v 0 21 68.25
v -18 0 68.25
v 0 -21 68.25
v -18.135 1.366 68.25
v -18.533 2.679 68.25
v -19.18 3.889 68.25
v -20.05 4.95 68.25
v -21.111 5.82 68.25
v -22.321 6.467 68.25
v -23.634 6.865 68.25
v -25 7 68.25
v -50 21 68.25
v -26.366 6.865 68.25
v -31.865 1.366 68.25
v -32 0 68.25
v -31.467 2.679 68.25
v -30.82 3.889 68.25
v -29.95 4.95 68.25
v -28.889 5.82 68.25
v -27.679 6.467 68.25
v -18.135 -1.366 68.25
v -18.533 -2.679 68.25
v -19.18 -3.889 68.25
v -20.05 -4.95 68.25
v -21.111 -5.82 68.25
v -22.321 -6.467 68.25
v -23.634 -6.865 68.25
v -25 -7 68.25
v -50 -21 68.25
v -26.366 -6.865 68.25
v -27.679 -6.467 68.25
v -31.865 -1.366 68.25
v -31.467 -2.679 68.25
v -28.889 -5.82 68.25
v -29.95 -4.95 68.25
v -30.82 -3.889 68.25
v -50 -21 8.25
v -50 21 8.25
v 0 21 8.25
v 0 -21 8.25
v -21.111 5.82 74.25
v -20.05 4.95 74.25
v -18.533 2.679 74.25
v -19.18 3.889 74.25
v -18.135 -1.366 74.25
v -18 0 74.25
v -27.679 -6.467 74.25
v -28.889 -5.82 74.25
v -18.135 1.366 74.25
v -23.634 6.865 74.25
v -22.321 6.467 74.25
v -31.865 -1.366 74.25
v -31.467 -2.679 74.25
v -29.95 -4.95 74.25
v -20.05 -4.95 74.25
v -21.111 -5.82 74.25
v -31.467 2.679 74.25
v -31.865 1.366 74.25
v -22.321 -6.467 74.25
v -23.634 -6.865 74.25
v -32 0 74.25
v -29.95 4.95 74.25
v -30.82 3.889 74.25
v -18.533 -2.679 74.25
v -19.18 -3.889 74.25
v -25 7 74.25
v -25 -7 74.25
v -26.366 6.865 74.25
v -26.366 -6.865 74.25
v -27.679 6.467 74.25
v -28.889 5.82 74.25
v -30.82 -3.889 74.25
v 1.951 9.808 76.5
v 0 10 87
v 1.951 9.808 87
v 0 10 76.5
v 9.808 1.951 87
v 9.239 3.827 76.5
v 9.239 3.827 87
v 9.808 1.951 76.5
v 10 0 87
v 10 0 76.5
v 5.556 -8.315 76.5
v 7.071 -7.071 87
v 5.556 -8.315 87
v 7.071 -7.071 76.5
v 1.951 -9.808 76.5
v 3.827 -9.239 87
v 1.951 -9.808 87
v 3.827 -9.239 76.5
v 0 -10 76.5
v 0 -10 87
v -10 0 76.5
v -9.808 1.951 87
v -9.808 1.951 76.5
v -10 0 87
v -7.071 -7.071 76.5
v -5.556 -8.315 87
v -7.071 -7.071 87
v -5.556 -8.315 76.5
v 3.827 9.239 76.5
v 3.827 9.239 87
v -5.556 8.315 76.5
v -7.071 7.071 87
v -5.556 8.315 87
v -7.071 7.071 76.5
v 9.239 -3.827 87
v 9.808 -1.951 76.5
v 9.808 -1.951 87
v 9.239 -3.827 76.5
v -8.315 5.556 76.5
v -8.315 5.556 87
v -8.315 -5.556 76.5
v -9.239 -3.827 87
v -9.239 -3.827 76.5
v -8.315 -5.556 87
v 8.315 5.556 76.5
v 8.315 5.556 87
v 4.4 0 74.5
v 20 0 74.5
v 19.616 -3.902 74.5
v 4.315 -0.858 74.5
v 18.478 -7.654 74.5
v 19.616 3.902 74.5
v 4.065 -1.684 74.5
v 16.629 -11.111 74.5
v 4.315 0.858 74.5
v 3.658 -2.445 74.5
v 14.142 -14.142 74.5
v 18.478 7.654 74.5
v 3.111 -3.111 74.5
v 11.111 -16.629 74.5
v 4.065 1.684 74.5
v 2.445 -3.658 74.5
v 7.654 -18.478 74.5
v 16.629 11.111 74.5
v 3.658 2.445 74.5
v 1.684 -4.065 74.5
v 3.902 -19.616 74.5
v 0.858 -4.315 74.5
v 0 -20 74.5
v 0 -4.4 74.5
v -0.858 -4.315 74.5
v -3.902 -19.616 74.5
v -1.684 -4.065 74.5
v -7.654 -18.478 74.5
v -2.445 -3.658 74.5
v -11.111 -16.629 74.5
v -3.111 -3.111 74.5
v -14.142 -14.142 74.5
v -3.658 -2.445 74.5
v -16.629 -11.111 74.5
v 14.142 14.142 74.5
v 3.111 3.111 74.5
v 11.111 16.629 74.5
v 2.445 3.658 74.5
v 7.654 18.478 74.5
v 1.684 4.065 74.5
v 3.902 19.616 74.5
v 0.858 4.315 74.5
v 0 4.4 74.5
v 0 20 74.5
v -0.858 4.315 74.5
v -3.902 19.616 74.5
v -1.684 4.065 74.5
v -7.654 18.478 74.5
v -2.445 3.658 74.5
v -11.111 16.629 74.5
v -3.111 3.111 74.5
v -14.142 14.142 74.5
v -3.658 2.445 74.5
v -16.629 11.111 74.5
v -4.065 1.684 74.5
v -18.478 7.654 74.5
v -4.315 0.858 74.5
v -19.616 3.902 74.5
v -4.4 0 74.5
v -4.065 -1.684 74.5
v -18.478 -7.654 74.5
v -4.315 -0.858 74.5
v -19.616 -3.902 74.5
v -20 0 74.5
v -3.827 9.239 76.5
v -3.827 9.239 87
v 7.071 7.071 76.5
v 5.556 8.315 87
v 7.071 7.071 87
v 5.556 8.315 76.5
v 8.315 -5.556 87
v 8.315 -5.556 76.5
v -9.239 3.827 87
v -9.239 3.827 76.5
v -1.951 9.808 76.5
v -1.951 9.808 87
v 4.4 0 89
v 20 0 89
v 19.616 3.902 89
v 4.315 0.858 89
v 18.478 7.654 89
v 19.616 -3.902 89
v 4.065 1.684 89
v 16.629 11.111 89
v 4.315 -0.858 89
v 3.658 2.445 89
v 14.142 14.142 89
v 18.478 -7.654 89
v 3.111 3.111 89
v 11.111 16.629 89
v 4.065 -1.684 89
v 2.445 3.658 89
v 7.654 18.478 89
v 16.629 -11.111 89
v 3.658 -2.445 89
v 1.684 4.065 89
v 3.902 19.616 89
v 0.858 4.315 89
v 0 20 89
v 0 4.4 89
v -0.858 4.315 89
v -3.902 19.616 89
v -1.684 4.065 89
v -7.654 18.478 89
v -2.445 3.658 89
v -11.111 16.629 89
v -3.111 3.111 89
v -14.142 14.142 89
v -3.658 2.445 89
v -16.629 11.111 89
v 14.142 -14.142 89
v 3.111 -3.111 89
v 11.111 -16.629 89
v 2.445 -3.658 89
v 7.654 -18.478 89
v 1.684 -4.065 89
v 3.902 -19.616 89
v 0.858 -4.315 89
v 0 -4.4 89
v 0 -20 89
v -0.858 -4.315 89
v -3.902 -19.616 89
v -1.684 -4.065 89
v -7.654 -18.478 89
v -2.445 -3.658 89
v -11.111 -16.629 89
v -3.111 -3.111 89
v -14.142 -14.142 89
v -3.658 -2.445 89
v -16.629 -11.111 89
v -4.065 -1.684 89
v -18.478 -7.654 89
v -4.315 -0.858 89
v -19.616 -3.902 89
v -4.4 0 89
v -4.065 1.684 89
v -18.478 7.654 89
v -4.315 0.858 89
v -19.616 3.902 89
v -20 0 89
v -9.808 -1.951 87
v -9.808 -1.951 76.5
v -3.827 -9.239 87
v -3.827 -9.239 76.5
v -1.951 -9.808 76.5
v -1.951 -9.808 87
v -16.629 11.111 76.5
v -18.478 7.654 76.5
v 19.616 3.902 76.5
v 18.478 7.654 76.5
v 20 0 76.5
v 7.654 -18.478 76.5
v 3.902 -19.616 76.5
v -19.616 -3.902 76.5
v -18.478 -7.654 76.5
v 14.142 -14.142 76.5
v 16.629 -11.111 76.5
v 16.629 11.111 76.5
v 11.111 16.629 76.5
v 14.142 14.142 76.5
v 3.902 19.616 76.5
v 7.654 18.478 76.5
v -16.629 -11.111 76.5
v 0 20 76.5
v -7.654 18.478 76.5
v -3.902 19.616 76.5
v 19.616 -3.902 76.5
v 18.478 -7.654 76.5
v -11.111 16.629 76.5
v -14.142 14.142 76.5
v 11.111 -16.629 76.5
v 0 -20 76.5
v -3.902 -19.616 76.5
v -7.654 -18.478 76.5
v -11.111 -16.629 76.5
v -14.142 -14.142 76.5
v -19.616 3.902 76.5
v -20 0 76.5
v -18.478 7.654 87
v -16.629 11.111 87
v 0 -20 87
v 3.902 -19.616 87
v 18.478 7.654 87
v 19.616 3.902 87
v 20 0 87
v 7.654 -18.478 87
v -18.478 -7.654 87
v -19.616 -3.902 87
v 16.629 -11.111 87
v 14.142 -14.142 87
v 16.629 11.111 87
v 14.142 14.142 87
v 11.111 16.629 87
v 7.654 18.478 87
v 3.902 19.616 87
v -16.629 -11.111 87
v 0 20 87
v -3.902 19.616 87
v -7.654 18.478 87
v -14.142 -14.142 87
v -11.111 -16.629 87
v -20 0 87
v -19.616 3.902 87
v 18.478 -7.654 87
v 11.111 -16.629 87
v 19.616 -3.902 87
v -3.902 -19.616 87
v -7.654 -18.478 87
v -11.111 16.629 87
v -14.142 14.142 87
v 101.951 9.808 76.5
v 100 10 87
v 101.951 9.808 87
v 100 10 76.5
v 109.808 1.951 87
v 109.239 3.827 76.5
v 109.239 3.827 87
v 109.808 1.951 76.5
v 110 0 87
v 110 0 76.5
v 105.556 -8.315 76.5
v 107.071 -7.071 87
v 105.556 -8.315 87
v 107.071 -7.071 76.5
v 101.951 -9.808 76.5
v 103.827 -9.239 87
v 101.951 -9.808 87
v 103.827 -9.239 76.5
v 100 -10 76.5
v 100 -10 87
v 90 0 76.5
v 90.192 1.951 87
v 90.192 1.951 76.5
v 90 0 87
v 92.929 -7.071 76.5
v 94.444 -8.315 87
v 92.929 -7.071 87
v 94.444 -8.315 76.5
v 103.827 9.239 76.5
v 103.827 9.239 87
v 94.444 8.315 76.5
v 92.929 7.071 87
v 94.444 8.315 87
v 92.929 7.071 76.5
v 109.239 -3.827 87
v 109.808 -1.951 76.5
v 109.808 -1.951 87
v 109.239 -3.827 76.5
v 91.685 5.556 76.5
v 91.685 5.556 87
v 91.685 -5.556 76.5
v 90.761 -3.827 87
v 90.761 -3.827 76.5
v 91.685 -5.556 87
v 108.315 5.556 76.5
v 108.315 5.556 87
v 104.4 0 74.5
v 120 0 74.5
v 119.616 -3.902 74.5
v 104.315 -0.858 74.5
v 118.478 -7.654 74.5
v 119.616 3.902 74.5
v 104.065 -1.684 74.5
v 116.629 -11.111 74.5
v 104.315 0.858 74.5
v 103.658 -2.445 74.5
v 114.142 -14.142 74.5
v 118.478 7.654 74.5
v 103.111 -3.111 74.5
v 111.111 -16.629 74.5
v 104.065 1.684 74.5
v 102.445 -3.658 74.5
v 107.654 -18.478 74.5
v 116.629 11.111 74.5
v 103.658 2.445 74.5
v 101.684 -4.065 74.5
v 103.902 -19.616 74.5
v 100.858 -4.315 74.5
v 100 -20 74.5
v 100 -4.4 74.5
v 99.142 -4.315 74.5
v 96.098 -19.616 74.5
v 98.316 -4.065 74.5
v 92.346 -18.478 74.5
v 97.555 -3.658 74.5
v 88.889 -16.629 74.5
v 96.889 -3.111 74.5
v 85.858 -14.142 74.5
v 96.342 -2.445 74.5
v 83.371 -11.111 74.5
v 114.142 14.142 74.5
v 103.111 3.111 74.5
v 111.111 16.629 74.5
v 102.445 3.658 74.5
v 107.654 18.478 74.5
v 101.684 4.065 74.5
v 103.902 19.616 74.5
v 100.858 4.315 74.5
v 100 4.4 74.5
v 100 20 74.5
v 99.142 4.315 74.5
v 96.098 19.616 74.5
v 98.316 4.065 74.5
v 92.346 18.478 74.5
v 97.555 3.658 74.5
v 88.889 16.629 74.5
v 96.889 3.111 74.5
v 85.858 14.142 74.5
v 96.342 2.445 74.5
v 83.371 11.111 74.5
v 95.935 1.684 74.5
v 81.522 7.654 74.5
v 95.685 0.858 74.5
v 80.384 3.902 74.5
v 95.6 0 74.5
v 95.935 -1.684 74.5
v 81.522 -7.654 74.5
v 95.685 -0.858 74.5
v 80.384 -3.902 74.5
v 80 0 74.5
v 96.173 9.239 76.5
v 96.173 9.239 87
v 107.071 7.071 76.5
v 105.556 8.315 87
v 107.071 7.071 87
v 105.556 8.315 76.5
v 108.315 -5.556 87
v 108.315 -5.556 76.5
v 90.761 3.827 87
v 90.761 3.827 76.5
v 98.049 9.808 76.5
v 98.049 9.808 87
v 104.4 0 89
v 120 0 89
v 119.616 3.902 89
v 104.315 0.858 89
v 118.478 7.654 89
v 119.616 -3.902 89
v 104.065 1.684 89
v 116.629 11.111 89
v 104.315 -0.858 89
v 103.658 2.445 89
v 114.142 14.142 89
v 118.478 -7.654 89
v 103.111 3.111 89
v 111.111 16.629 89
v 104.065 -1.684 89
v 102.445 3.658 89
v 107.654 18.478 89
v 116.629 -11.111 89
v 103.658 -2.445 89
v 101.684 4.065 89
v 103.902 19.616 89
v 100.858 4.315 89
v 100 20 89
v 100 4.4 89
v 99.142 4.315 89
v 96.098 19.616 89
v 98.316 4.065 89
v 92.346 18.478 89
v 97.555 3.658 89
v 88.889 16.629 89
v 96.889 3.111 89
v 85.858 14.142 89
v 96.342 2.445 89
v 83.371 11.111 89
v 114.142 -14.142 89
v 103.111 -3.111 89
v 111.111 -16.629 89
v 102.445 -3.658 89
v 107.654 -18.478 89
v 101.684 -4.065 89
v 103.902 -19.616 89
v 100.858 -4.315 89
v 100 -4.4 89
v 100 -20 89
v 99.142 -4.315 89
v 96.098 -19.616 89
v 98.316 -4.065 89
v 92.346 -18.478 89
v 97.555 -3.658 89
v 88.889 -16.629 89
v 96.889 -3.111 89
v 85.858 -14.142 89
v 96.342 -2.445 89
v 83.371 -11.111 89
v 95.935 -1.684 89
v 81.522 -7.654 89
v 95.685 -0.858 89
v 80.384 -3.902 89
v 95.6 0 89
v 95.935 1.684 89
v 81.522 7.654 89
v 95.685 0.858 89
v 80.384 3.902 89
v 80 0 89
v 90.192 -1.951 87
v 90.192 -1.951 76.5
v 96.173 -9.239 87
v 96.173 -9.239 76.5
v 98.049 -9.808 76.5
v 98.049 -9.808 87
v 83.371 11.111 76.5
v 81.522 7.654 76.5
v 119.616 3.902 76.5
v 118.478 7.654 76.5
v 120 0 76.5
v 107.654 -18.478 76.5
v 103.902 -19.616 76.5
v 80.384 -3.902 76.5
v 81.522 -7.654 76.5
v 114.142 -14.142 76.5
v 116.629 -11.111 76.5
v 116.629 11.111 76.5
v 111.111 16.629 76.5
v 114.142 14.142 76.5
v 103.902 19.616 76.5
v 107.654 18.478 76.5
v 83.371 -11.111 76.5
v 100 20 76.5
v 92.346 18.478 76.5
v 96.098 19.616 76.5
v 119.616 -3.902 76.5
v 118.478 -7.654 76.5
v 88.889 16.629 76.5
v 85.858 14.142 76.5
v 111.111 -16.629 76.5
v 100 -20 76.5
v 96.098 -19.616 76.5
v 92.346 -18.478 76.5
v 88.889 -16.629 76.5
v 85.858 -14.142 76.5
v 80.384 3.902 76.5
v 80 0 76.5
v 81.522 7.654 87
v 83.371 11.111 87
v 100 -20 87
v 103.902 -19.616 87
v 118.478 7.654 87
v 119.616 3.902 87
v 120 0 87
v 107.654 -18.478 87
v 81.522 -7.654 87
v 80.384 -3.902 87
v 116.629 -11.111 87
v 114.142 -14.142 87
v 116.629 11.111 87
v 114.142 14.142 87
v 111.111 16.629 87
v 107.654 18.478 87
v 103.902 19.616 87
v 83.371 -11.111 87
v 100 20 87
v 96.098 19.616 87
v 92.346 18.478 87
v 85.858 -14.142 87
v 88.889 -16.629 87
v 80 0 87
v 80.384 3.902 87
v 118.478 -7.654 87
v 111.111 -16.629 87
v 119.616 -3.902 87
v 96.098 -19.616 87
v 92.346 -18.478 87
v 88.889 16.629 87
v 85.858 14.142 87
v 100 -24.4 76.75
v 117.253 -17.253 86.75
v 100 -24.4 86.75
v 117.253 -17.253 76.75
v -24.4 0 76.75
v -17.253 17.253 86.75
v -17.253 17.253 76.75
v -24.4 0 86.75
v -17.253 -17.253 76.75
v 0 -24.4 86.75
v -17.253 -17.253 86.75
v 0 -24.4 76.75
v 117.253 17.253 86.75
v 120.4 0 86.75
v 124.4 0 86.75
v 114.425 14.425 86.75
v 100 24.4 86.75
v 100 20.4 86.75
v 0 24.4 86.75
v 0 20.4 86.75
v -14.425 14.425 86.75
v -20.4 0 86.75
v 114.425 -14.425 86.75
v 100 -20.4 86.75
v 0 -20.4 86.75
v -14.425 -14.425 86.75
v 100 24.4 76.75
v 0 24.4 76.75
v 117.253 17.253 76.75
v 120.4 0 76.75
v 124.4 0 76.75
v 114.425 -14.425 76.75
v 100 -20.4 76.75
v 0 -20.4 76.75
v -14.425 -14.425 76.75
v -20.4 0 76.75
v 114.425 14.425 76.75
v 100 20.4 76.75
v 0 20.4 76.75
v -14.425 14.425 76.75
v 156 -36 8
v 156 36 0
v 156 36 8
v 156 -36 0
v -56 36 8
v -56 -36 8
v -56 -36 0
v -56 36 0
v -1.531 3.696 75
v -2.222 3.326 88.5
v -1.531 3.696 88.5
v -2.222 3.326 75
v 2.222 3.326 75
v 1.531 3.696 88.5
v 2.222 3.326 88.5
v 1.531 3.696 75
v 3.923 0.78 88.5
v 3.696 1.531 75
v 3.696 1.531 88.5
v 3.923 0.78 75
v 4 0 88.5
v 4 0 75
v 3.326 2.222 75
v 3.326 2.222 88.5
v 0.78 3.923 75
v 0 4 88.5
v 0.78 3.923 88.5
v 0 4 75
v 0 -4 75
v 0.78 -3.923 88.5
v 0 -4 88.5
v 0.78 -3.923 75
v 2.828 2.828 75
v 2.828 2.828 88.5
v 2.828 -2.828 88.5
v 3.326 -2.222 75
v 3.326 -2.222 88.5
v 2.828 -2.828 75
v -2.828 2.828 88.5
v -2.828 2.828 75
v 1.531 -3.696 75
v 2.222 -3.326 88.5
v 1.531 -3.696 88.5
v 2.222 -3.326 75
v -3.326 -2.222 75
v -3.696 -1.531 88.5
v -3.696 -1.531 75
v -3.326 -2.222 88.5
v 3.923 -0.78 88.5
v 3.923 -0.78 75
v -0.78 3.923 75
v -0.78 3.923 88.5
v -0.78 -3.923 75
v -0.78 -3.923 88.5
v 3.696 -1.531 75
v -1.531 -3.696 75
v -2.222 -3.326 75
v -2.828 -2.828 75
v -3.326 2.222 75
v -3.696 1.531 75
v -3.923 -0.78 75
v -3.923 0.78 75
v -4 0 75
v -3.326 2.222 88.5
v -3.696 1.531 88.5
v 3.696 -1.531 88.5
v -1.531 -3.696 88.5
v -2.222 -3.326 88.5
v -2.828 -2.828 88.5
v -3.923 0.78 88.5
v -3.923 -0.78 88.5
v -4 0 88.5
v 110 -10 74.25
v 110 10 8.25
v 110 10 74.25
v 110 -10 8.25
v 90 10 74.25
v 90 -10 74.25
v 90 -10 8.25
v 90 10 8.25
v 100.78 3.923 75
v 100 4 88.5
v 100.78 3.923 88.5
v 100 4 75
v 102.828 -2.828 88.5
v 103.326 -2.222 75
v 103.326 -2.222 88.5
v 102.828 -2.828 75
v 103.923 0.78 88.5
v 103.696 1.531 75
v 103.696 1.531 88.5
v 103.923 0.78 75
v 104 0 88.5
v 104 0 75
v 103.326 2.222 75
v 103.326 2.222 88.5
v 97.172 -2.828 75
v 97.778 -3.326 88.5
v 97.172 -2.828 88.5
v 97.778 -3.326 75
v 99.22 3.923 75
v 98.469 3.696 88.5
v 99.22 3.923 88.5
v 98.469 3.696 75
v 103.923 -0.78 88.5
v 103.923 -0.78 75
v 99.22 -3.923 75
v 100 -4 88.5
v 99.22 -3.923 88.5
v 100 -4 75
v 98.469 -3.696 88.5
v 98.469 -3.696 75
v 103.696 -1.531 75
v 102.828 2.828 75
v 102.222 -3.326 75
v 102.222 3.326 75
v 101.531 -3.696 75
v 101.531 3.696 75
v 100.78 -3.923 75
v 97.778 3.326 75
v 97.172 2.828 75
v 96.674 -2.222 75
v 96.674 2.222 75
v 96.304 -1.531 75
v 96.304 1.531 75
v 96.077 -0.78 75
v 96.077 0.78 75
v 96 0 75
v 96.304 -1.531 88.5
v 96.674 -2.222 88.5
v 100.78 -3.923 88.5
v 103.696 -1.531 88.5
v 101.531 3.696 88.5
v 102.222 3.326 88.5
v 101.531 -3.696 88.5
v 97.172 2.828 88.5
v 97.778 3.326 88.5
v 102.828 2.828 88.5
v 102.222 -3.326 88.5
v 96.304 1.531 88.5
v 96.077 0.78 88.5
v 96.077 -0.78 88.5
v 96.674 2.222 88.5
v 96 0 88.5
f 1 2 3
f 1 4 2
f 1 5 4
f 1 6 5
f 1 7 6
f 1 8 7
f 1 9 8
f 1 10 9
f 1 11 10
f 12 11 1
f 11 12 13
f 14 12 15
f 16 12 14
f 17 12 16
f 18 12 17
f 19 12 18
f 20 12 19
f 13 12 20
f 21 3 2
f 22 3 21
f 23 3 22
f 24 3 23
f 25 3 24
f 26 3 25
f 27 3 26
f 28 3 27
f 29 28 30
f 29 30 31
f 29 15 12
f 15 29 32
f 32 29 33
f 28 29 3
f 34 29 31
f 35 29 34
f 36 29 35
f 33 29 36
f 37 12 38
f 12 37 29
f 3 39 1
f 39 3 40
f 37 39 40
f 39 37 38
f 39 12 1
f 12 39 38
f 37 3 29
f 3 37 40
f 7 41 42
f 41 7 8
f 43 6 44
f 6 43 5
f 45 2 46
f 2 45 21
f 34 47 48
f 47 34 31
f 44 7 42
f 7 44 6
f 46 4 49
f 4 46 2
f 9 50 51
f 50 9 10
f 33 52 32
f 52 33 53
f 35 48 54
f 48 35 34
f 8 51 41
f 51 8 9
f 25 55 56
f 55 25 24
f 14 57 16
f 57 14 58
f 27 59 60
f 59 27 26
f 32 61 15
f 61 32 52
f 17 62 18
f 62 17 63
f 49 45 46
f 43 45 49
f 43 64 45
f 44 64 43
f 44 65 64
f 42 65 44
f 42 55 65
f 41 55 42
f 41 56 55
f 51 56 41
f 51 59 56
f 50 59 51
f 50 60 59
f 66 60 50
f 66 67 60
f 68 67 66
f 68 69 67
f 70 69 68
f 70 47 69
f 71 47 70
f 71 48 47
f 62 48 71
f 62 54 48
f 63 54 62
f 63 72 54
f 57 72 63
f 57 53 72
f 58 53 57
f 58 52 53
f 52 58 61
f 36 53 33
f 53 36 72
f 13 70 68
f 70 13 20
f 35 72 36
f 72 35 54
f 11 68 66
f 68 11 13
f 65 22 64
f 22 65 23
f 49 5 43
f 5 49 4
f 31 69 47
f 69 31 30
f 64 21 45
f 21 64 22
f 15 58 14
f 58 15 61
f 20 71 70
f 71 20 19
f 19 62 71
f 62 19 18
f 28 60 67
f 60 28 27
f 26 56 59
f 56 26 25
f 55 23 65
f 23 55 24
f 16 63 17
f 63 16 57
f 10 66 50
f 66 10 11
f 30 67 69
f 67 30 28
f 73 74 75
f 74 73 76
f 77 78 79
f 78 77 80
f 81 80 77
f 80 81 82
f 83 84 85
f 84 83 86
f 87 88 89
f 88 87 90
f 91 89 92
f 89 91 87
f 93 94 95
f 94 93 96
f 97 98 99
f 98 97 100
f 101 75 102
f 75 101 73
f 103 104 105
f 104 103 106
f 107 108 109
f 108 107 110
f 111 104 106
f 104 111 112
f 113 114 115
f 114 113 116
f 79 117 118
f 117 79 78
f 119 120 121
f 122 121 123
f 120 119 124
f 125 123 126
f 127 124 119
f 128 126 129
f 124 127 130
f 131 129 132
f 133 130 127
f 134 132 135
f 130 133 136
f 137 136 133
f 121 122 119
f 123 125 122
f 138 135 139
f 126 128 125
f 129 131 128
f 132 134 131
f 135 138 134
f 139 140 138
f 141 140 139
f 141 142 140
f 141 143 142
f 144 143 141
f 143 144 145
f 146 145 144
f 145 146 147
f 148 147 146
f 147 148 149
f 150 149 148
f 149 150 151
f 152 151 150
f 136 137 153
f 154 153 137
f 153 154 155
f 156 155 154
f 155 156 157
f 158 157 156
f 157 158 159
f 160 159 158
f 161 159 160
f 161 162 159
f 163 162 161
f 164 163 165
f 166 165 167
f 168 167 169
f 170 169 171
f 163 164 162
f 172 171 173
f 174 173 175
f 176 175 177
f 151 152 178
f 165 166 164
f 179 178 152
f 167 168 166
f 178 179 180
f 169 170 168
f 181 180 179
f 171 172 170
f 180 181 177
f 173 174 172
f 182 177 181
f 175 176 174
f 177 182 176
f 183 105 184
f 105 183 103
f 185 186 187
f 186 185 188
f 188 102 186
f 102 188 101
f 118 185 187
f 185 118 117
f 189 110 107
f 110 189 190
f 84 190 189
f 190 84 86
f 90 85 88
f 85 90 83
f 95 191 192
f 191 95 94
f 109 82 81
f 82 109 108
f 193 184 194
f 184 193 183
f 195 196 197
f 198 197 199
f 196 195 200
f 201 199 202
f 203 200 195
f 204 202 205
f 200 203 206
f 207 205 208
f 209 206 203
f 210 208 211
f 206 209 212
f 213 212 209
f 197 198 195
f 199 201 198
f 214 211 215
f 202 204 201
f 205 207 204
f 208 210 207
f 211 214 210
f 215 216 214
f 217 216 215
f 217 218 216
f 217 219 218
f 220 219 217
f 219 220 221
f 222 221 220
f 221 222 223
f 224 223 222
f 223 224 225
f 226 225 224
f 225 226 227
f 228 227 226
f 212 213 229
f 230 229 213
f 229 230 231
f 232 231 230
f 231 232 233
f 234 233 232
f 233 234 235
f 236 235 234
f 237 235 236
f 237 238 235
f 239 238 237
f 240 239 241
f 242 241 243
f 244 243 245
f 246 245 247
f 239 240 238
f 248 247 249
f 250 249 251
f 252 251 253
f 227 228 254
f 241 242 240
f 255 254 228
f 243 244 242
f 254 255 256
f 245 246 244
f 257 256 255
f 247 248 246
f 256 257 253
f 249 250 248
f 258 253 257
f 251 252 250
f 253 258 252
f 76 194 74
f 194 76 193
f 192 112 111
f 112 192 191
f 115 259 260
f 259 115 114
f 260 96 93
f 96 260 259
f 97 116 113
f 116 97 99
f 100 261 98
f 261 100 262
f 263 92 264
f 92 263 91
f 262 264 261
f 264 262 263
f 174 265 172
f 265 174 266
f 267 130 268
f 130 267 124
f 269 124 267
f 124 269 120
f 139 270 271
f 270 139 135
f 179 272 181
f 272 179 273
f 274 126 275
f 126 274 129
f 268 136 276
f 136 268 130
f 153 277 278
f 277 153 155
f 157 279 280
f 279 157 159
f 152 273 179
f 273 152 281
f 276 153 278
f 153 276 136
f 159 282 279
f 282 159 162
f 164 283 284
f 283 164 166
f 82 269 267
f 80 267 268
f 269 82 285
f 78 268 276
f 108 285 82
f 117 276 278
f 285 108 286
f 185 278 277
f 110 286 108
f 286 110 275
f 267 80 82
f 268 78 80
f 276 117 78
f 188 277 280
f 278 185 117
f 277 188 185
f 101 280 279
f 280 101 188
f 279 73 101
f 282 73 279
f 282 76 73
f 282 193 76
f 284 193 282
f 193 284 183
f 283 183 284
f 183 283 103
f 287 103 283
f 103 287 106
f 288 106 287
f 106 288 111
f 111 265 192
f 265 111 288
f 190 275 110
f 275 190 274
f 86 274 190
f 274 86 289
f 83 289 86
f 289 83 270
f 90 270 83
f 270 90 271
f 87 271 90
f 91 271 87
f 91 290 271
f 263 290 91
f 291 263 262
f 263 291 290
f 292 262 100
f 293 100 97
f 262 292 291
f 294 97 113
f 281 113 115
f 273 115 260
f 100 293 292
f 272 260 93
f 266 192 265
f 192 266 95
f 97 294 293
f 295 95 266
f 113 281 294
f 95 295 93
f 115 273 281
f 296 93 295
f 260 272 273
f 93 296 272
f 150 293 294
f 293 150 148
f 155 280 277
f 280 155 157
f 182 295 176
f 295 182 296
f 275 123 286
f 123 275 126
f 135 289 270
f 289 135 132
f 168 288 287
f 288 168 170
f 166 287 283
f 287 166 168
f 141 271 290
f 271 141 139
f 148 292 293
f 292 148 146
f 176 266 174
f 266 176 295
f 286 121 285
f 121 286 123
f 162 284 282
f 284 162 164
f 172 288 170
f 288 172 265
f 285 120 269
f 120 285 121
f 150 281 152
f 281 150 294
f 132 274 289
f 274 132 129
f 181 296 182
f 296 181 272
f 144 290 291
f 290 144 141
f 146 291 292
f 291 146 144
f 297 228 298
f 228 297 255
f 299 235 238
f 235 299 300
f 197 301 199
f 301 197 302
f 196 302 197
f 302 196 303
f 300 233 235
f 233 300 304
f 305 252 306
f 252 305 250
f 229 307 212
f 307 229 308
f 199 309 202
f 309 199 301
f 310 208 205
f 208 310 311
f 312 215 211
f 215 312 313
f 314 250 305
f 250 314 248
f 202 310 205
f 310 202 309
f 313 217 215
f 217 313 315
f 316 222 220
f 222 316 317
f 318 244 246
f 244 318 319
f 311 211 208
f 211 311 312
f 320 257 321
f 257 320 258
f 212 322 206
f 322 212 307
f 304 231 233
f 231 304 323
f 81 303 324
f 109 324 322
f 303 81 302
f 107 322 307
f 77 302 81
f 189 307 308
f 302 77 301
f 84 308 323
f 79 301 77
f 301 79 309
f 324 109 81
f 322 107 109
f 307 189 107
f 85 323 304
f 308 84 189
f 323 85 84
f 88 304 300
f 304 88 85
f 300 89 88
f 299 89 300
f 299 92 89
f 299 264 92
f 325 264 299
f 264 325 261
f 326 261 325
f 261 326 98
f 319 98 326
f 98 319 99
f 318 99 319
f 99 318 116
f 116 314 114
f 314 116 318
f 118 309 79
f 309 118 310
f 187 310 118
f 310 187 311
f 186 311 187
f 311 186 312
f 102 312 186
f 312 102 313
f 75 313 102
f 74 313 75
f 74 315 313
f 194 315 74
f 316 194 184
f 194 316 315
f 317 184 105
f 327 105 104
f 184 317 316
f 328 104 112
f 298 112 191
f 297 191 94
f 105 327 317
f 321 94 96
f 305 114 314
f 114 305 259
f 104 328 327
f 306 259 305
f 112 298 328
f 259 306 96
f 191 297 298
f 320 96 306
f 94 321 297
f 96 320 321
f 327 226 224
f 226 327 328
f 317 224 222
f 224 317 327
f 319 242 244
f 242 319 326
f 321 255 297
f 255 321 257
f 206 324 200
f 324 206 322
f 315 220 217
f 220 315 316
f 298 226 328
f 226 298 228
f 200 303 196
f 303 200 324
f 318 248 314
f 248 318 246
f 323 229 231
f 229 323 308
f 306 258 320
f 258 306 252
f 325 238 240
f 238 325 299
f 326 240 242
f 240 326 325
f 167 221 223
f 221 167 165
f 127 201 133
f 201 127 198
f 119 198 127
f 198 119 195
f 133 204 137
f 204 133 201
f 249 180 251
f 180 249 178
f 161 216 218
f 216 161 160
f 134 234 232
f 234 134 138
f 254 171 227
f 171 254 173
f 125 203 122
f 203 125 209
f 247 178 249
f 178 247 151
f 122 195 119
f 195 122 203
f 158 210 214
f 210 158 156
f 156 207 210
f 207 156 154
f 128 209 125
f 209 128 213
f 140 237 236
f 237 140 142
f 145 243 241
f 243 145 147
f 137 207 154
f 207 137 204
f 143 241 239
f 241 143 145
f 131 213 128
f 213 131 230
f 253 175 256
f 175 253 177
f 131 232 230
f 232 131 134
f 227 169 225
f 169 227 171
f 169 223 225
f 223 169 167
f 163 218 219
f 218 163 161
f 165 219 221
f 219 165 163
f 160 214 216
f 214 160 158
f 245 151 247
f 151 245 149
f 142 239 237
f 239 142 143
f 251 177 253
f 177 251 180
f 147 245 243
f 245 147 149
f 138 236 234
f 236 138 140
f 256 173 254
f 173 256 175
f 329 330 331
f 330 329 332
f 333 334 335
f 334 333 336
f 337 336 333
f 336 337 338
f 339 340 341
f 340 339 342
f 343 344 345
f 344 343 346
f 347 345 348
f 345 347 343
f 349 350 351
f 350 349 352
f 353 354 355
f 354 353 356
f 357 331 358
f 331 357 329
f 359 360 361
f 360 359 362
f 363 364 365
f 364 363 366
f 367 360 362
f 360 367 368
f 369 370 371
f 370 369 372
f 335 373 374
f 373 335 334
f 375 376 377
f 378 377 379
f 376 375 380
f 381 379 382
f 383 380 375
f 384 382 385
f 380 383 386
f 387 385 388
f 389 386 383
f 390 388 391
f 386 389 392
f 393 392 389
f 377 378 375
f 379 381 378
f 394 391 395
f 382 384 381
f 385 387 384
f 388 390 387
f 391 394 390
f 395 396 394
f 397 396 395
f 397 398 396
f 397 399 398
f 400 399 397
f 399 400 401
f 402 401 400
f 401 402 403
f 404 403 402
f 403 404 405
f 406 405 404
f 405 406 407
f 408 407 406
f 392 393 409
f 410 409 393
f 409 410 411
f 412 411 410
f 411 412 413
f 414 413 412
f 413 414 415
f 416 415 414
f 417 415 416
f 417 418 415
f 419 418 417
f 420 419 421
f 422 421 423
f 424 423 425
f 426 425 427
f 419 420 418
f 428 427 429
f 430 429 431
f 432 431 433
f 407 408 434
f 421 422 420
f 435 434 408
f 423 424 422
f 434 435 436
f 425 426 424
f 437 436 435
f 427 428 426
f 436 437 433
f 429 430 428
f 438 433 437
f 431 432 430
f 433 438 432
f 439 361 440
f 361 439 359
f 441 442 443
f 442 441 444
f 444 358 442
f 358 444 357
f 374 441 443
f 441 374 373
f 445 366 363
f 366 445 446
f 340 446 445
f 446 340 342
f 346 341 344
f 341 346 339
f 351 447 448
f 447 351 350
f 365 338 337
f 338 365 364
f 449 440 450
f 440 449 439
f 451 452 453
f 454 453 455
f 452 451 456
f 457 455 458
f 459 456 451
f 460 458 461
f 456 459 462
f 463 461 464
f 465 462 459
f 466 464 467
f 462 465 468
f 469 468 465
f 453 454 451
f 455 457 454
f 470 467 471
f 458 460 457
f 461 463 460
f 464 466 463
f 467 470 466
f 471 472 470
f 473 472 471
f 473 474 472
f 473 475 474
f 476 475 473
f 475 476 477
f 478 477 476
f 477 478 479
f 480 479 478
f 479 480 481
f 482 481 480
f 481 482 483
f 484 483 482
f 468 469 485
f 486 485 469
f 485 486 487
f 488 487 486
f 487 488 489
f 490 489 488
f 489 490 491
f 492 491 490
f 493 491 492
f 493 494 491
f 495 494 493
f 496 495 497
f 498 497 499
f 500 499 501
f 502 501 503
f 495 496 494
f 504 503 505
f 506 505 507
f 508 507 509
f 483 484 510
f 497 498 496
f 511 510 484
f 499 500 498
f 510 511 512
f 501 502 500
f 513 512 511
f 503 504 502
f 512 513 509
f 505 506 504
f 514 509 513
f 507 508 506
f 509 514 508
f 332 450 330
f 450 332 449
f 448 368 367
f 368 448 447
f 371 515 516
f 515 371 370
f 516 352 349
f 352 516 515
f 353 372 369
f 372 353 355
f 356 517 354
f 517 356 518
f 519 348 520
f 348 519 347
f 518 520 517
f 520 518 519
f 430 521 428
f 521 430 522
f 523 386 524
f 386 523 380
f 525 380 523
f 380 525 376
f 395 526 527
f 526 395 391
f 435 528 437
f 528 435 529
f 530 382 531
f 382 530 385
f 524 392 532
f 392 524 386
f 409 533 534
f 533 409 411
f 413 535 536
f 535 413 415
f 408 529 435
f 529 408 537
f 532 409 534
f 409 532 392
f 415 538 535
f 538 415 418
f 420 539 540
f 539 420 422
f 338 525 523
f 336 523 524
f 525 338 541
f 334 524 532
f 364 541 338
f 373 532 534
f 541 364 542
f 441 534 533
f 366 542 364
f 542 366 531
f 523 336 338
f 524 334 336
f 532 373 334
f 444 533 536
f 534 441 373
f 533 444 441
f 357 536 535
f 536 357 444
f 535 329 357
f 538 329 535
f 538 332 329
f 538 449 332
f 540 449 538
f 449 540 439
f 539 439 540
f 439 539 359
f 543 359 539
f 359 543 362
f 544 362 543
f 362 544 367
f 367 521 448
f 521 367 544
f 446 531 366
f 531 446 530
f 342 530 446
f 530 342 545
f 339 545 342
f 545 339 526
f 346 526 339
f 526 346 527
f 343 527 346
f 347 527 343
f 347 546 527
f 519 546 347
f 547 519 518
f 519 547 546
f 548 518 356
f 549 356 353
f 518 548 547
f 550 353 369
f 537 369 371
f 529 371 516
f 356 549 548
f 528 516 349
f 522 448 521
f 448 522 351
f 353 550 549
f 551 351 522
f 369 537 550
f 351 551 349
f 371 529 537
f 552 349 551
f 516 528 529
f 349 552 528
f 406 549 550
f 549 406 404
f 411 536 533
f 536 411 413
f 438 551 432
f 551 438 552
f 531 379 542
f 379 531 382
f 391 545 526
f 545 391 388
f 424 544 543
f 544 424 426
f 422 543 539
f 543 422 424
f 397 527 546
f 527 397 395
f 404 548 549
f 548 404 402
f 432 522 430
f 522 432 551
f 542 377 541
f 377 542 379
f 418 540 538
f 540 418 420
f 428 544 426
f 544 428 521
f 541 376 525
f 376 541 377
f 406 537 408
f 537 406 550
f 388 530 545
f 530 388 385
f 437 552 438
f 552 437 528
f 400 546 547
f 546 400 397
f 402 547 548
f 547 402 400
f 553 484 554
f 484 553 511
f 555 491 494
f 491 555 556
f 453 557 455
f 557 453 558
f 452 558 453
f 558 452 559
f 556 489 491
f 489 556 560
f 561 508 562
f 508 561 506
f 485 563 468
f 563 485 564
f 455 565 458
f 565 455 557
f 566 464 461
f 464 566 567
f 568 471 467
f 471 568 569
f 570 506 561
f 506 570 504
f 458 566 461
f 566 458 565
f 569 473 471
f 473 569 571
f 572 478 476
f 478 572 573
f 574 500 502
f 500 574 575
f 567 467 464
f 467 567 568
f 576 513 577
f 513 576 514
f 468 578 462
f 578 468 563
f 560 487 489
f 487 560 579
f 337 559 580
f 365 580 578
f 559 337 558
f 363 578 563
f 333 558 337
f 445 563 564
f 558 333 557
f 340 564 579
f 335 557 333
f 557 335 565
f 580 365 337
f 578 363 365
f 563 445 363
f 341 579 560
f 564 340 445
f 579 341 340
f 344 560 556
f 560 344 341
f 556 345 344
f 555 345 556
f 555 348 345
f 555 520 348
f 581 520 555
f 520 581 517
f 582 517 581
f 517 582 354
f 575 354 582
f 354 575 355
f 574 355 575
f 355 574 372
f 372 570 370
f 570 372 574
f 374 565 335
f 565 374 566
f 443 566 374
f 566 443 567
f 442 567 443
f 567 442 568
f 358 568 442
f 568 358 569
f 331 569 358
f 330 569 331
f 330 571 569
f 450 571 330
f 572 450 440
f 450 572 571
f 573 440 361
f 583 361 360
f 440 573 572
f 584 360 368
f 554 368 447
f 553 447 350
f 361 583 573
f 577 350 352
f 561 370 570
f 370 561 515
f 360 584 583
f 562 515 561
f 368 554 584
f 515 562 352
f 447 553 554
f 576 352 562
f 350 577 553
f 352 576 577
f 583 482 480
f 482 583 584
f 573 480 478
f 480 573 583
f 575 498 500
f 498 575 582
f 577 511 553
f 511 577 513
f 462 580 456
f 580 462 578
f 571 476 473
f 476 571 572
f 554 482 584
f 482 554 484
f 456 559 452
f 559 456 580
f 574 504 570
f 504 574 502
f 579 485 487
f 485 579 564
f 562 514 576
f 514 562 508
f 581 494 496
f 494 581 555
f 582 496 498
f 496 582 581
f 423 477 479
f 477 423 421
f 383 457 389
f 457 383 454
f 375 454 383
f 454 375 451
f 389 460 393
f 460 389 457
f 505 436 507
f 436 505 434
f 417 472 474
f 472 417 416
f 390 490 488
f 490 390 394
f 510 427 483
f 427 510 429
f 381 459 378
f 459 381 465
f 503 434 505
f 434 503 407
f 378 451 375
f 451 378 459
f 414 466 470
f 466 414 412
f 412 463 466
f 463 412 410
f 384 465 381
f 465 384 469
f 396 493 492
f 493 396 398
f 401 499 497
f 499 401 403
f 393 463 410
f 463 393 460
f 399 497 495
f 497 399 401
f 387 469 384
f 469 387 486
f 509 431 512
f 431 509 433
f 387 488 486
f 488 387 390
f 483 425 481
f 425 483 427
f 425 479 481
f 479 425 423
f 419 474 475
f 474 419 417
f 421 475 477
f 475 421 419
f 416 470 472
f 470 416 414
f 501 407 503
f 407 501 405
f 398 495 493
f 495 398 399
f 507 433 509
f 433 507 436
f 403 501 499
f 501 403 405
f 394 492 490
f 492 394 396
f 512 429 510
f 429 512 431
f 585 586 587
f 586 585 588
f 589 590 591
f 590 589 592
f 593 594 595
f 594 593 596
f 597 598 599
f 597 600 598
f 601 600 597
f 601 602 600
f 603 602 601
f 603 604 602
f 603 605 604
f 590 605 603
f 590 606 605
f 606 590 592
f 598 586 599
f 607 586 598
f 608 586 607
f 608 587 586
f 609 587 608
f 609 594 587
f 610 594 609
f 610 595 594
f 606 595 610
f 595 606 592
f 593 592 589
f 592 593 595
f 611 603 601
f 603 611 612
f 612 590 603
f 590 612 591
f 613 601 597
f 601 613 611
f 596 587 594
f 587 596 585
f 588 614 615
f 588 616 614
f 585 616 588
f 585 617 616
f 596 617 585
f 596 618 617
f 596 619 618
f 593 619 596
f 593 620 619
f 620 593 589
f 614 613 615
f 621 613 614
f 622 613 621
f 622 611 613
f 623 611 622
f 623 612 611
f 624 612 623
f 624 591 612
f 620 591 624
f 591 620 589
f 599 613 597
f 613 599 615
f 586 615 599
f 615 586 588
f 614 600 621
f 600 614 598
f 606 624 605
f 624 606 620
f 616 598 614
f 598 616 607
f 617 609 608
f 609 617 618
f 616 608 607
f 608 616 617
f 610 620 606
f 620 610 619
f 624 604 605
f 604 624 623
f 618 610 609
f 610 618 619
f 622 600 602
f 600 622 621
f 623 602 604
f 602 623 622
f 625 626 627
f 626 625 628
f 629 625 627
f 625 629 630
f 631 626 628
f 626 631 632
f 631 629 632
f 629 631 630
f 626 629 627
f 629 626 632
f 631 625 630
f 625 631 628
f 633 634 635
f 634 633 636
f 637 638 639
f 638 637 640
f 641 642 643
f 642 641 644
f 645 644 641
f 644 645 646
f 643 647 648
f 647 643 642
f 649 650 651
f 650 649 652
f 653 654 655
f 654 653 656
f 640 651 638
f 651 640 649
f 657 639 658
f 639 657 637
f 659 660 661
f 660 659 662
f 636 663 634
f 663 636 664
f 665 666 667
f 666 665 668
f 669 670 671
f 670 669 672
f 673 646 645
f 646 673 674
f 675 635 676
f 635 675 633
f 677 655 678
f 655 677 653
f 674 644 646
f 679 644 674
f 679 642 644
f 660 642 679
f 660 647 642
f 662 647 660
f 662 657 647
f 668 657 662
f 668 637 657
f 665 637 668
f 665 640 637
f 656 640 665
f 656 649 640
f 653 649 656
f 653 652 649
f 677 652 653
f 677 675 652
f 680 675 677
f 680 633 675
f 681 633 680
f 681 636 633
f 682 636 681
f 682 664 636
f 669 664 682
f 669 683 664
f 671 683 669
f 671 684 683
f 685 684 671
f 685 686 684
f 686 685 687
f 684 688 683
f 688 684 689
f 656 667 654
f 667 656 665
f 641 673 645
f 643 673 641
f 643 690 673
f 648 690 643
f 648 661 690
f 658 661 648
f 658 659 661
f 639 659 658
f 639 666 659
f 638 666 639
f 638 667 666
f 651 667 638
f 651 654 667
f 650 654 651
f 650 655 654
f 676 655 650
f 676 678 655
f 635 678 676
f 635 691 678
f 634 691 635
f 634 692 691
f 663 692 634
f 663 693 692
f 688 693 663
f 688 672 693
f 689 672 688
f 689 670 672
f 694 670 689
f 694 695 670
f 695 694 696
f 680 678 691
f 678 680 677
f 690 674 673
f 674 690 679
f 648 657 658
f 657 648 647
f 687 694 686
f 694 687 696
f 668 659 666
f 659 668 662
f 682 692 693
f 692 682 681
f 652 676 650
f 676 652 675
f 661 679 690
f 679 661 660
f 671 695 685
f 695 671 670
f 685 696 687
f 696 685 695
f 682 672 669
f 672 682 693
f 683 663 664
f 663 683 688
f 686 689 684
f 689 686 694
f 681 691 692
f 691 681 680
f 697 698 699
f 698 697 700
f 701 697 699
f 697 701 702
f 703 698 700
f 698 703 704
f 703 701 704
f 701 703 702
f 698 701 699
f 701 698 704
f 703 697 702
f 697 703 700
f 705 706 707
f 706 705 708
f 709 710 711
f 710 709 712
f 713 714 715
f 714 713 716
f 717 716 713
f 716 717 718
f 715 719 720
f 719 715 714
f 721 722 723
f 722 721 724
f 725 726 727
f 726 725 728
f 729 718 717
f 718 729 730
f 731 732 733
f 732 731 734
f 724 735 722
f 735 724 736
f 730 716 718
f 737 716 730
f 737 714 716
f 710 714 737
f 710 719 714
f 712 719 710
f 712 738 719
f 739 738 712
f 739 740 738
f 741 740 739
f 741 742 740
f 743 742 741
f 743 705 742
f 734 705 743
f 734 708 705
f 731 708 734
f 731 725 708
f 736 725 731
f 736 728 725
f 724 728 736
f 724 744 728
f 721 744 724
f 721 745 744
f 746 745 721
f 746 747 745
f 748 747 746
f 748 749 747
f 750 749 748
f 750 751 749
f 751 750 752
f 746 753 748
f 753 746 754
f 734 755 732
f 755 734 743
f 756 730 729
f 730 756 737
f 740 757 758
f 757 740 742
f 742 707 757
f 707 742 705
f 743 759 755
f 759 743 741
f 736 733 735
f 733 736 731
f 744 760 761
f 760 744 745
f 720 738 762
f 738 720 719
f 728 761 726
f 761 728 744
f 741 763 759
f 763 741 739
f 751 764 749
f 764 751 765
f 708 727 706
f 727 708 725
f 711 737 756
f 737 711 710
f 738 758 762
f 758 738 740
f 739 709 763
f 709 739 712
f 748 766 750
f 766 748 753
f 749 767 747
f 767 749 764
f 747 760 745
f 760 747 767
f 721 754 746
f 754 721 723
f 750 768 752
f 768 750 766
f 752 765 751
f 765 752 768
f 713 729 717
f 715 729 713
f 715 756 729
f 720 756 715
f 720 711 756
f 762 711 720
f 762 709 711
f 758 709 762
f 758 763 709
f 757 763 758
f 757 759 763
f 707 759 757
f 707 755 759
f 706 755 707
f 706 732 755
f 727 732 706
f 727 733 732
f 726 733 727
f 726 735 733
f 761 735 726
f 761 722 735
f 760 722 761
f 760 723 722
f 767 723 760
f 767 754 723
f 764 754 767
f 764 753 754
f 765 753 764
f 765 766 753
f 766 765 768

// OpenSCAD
$fn = 32;

// ------------------------------------------------------------------------
// Motor belt drive: span 100 mm, pulleys d40, belt 10 mm wide
// Every part is its own module, assembly() places every instance.
// ------------------------------------------------------------------------

// --- part 1 ---
module base_plate() {
  difference() {
    translate([-106, -36, 0]) cube([212, 72, 8]);
  }
}

// --- part 2 ---
module motor() {
  union() {
    translate([-30, -21, 0]) cube([60, 42, 50]);
    translate([33, 0, 25]) rotate([0, 90, 0]) cylinder(h = 6, d = 14, center = true);
  }
}

// --- part 3 ---
module drive_shaft() {
  translate([0, 0, -6.75]) cylinder(h = 13.5, d = 8);
}

// --- part 4 ---
module pulley_drive() {
  difference() {
    union() {
      cylinder(h = 14.5, d = 20);
      cylinder(h = 2, d = 40);
      translate([0, 0, 12.5]) cylinder(h = 2, d = 40);
    }
    translate([0, 0, -1]) cylinder(h = 16.5, d = 8.8);
  }
}

// --- part 5 ---
module idler_post() {
  translate([-10, -10, 0]) cube([20, 20, 66]);
}

// --- part 6 ---
module driven_shaft() {
  translate([0, 0, -6.75]) cylinder(h = 13.5, d = 8);
}

// --- part 7 ---
module pulley_driven() {
  difference() {
    union() {
      cylinder(h = 14.5, d = 20);
      cylinder(h = 2, d = 40);
      translate([0, 0, 12.5]) cylinder(h = 2, d = 40);
    }
    translate([0, 0, -1]) cylinder(h = 16.5, d = 8.8);
  }
}

// --- part 8 ---
module drive_belt() {
  difference() {
    linear_extrude(height = 10) polygon(points = concat([for (a = [90 : 45 : 270]) [24.4 * cos(a), 24.4 * sin(a)]], [for (a = [270 : 45 : 450]) [100 + 24.4 * cos(a), 24.4 * sin(a)]]));
    translate([0, 0, -1]) linear_extrude(height = 12) polygon(points = concat([for (a = [90 : 45 : 270]) [20.4 * cos(a), 20.4 * sin(a)]], [for (a = [270 : 45 : 450]) [100 + 20.4 * cos(a), 20.4 * sin(a)]]));
  }
}

// --- assembly ---
module assembly() {
  color([0.80, 0.24, 0.20]) translate([50, 0, 0]) rotate([0, 0, 0]) base_plate();
  color([0.20, 0.45, 0.75]) translate([0, 0, 38.25]) rotate([0, 270, 0]) motor();
  color([0.25, 0.62, 0.32]) translate([0, 0, 81.75]) rotate([0, 0, 0]) drive_shaft();
  color([0.92, 0.70, 0.18]) translate([0, 0, 74.5]) rotate([0, 0, 0]) pulley_drive();
  color([0.58, 0.35, 0.70]) translate([100, 0, 8.25]) rotate([0, 0, 0]) idler_post();
  color([0.16, 0.66, 0.66]) translate([100, 0, 81.75]) rotate([0, 0, 0]) driven_shaft();
  color([0.85, 0.48, 0.18]) translate([100, 0, 74.5]) rotate([0, 0, 0]) pulley_driven();
  color([0.55, 0.60, 0.65]) translate([0, 0, 76.75]) rotate([0, 0, 0]) drive_belt();
}

assembly();
